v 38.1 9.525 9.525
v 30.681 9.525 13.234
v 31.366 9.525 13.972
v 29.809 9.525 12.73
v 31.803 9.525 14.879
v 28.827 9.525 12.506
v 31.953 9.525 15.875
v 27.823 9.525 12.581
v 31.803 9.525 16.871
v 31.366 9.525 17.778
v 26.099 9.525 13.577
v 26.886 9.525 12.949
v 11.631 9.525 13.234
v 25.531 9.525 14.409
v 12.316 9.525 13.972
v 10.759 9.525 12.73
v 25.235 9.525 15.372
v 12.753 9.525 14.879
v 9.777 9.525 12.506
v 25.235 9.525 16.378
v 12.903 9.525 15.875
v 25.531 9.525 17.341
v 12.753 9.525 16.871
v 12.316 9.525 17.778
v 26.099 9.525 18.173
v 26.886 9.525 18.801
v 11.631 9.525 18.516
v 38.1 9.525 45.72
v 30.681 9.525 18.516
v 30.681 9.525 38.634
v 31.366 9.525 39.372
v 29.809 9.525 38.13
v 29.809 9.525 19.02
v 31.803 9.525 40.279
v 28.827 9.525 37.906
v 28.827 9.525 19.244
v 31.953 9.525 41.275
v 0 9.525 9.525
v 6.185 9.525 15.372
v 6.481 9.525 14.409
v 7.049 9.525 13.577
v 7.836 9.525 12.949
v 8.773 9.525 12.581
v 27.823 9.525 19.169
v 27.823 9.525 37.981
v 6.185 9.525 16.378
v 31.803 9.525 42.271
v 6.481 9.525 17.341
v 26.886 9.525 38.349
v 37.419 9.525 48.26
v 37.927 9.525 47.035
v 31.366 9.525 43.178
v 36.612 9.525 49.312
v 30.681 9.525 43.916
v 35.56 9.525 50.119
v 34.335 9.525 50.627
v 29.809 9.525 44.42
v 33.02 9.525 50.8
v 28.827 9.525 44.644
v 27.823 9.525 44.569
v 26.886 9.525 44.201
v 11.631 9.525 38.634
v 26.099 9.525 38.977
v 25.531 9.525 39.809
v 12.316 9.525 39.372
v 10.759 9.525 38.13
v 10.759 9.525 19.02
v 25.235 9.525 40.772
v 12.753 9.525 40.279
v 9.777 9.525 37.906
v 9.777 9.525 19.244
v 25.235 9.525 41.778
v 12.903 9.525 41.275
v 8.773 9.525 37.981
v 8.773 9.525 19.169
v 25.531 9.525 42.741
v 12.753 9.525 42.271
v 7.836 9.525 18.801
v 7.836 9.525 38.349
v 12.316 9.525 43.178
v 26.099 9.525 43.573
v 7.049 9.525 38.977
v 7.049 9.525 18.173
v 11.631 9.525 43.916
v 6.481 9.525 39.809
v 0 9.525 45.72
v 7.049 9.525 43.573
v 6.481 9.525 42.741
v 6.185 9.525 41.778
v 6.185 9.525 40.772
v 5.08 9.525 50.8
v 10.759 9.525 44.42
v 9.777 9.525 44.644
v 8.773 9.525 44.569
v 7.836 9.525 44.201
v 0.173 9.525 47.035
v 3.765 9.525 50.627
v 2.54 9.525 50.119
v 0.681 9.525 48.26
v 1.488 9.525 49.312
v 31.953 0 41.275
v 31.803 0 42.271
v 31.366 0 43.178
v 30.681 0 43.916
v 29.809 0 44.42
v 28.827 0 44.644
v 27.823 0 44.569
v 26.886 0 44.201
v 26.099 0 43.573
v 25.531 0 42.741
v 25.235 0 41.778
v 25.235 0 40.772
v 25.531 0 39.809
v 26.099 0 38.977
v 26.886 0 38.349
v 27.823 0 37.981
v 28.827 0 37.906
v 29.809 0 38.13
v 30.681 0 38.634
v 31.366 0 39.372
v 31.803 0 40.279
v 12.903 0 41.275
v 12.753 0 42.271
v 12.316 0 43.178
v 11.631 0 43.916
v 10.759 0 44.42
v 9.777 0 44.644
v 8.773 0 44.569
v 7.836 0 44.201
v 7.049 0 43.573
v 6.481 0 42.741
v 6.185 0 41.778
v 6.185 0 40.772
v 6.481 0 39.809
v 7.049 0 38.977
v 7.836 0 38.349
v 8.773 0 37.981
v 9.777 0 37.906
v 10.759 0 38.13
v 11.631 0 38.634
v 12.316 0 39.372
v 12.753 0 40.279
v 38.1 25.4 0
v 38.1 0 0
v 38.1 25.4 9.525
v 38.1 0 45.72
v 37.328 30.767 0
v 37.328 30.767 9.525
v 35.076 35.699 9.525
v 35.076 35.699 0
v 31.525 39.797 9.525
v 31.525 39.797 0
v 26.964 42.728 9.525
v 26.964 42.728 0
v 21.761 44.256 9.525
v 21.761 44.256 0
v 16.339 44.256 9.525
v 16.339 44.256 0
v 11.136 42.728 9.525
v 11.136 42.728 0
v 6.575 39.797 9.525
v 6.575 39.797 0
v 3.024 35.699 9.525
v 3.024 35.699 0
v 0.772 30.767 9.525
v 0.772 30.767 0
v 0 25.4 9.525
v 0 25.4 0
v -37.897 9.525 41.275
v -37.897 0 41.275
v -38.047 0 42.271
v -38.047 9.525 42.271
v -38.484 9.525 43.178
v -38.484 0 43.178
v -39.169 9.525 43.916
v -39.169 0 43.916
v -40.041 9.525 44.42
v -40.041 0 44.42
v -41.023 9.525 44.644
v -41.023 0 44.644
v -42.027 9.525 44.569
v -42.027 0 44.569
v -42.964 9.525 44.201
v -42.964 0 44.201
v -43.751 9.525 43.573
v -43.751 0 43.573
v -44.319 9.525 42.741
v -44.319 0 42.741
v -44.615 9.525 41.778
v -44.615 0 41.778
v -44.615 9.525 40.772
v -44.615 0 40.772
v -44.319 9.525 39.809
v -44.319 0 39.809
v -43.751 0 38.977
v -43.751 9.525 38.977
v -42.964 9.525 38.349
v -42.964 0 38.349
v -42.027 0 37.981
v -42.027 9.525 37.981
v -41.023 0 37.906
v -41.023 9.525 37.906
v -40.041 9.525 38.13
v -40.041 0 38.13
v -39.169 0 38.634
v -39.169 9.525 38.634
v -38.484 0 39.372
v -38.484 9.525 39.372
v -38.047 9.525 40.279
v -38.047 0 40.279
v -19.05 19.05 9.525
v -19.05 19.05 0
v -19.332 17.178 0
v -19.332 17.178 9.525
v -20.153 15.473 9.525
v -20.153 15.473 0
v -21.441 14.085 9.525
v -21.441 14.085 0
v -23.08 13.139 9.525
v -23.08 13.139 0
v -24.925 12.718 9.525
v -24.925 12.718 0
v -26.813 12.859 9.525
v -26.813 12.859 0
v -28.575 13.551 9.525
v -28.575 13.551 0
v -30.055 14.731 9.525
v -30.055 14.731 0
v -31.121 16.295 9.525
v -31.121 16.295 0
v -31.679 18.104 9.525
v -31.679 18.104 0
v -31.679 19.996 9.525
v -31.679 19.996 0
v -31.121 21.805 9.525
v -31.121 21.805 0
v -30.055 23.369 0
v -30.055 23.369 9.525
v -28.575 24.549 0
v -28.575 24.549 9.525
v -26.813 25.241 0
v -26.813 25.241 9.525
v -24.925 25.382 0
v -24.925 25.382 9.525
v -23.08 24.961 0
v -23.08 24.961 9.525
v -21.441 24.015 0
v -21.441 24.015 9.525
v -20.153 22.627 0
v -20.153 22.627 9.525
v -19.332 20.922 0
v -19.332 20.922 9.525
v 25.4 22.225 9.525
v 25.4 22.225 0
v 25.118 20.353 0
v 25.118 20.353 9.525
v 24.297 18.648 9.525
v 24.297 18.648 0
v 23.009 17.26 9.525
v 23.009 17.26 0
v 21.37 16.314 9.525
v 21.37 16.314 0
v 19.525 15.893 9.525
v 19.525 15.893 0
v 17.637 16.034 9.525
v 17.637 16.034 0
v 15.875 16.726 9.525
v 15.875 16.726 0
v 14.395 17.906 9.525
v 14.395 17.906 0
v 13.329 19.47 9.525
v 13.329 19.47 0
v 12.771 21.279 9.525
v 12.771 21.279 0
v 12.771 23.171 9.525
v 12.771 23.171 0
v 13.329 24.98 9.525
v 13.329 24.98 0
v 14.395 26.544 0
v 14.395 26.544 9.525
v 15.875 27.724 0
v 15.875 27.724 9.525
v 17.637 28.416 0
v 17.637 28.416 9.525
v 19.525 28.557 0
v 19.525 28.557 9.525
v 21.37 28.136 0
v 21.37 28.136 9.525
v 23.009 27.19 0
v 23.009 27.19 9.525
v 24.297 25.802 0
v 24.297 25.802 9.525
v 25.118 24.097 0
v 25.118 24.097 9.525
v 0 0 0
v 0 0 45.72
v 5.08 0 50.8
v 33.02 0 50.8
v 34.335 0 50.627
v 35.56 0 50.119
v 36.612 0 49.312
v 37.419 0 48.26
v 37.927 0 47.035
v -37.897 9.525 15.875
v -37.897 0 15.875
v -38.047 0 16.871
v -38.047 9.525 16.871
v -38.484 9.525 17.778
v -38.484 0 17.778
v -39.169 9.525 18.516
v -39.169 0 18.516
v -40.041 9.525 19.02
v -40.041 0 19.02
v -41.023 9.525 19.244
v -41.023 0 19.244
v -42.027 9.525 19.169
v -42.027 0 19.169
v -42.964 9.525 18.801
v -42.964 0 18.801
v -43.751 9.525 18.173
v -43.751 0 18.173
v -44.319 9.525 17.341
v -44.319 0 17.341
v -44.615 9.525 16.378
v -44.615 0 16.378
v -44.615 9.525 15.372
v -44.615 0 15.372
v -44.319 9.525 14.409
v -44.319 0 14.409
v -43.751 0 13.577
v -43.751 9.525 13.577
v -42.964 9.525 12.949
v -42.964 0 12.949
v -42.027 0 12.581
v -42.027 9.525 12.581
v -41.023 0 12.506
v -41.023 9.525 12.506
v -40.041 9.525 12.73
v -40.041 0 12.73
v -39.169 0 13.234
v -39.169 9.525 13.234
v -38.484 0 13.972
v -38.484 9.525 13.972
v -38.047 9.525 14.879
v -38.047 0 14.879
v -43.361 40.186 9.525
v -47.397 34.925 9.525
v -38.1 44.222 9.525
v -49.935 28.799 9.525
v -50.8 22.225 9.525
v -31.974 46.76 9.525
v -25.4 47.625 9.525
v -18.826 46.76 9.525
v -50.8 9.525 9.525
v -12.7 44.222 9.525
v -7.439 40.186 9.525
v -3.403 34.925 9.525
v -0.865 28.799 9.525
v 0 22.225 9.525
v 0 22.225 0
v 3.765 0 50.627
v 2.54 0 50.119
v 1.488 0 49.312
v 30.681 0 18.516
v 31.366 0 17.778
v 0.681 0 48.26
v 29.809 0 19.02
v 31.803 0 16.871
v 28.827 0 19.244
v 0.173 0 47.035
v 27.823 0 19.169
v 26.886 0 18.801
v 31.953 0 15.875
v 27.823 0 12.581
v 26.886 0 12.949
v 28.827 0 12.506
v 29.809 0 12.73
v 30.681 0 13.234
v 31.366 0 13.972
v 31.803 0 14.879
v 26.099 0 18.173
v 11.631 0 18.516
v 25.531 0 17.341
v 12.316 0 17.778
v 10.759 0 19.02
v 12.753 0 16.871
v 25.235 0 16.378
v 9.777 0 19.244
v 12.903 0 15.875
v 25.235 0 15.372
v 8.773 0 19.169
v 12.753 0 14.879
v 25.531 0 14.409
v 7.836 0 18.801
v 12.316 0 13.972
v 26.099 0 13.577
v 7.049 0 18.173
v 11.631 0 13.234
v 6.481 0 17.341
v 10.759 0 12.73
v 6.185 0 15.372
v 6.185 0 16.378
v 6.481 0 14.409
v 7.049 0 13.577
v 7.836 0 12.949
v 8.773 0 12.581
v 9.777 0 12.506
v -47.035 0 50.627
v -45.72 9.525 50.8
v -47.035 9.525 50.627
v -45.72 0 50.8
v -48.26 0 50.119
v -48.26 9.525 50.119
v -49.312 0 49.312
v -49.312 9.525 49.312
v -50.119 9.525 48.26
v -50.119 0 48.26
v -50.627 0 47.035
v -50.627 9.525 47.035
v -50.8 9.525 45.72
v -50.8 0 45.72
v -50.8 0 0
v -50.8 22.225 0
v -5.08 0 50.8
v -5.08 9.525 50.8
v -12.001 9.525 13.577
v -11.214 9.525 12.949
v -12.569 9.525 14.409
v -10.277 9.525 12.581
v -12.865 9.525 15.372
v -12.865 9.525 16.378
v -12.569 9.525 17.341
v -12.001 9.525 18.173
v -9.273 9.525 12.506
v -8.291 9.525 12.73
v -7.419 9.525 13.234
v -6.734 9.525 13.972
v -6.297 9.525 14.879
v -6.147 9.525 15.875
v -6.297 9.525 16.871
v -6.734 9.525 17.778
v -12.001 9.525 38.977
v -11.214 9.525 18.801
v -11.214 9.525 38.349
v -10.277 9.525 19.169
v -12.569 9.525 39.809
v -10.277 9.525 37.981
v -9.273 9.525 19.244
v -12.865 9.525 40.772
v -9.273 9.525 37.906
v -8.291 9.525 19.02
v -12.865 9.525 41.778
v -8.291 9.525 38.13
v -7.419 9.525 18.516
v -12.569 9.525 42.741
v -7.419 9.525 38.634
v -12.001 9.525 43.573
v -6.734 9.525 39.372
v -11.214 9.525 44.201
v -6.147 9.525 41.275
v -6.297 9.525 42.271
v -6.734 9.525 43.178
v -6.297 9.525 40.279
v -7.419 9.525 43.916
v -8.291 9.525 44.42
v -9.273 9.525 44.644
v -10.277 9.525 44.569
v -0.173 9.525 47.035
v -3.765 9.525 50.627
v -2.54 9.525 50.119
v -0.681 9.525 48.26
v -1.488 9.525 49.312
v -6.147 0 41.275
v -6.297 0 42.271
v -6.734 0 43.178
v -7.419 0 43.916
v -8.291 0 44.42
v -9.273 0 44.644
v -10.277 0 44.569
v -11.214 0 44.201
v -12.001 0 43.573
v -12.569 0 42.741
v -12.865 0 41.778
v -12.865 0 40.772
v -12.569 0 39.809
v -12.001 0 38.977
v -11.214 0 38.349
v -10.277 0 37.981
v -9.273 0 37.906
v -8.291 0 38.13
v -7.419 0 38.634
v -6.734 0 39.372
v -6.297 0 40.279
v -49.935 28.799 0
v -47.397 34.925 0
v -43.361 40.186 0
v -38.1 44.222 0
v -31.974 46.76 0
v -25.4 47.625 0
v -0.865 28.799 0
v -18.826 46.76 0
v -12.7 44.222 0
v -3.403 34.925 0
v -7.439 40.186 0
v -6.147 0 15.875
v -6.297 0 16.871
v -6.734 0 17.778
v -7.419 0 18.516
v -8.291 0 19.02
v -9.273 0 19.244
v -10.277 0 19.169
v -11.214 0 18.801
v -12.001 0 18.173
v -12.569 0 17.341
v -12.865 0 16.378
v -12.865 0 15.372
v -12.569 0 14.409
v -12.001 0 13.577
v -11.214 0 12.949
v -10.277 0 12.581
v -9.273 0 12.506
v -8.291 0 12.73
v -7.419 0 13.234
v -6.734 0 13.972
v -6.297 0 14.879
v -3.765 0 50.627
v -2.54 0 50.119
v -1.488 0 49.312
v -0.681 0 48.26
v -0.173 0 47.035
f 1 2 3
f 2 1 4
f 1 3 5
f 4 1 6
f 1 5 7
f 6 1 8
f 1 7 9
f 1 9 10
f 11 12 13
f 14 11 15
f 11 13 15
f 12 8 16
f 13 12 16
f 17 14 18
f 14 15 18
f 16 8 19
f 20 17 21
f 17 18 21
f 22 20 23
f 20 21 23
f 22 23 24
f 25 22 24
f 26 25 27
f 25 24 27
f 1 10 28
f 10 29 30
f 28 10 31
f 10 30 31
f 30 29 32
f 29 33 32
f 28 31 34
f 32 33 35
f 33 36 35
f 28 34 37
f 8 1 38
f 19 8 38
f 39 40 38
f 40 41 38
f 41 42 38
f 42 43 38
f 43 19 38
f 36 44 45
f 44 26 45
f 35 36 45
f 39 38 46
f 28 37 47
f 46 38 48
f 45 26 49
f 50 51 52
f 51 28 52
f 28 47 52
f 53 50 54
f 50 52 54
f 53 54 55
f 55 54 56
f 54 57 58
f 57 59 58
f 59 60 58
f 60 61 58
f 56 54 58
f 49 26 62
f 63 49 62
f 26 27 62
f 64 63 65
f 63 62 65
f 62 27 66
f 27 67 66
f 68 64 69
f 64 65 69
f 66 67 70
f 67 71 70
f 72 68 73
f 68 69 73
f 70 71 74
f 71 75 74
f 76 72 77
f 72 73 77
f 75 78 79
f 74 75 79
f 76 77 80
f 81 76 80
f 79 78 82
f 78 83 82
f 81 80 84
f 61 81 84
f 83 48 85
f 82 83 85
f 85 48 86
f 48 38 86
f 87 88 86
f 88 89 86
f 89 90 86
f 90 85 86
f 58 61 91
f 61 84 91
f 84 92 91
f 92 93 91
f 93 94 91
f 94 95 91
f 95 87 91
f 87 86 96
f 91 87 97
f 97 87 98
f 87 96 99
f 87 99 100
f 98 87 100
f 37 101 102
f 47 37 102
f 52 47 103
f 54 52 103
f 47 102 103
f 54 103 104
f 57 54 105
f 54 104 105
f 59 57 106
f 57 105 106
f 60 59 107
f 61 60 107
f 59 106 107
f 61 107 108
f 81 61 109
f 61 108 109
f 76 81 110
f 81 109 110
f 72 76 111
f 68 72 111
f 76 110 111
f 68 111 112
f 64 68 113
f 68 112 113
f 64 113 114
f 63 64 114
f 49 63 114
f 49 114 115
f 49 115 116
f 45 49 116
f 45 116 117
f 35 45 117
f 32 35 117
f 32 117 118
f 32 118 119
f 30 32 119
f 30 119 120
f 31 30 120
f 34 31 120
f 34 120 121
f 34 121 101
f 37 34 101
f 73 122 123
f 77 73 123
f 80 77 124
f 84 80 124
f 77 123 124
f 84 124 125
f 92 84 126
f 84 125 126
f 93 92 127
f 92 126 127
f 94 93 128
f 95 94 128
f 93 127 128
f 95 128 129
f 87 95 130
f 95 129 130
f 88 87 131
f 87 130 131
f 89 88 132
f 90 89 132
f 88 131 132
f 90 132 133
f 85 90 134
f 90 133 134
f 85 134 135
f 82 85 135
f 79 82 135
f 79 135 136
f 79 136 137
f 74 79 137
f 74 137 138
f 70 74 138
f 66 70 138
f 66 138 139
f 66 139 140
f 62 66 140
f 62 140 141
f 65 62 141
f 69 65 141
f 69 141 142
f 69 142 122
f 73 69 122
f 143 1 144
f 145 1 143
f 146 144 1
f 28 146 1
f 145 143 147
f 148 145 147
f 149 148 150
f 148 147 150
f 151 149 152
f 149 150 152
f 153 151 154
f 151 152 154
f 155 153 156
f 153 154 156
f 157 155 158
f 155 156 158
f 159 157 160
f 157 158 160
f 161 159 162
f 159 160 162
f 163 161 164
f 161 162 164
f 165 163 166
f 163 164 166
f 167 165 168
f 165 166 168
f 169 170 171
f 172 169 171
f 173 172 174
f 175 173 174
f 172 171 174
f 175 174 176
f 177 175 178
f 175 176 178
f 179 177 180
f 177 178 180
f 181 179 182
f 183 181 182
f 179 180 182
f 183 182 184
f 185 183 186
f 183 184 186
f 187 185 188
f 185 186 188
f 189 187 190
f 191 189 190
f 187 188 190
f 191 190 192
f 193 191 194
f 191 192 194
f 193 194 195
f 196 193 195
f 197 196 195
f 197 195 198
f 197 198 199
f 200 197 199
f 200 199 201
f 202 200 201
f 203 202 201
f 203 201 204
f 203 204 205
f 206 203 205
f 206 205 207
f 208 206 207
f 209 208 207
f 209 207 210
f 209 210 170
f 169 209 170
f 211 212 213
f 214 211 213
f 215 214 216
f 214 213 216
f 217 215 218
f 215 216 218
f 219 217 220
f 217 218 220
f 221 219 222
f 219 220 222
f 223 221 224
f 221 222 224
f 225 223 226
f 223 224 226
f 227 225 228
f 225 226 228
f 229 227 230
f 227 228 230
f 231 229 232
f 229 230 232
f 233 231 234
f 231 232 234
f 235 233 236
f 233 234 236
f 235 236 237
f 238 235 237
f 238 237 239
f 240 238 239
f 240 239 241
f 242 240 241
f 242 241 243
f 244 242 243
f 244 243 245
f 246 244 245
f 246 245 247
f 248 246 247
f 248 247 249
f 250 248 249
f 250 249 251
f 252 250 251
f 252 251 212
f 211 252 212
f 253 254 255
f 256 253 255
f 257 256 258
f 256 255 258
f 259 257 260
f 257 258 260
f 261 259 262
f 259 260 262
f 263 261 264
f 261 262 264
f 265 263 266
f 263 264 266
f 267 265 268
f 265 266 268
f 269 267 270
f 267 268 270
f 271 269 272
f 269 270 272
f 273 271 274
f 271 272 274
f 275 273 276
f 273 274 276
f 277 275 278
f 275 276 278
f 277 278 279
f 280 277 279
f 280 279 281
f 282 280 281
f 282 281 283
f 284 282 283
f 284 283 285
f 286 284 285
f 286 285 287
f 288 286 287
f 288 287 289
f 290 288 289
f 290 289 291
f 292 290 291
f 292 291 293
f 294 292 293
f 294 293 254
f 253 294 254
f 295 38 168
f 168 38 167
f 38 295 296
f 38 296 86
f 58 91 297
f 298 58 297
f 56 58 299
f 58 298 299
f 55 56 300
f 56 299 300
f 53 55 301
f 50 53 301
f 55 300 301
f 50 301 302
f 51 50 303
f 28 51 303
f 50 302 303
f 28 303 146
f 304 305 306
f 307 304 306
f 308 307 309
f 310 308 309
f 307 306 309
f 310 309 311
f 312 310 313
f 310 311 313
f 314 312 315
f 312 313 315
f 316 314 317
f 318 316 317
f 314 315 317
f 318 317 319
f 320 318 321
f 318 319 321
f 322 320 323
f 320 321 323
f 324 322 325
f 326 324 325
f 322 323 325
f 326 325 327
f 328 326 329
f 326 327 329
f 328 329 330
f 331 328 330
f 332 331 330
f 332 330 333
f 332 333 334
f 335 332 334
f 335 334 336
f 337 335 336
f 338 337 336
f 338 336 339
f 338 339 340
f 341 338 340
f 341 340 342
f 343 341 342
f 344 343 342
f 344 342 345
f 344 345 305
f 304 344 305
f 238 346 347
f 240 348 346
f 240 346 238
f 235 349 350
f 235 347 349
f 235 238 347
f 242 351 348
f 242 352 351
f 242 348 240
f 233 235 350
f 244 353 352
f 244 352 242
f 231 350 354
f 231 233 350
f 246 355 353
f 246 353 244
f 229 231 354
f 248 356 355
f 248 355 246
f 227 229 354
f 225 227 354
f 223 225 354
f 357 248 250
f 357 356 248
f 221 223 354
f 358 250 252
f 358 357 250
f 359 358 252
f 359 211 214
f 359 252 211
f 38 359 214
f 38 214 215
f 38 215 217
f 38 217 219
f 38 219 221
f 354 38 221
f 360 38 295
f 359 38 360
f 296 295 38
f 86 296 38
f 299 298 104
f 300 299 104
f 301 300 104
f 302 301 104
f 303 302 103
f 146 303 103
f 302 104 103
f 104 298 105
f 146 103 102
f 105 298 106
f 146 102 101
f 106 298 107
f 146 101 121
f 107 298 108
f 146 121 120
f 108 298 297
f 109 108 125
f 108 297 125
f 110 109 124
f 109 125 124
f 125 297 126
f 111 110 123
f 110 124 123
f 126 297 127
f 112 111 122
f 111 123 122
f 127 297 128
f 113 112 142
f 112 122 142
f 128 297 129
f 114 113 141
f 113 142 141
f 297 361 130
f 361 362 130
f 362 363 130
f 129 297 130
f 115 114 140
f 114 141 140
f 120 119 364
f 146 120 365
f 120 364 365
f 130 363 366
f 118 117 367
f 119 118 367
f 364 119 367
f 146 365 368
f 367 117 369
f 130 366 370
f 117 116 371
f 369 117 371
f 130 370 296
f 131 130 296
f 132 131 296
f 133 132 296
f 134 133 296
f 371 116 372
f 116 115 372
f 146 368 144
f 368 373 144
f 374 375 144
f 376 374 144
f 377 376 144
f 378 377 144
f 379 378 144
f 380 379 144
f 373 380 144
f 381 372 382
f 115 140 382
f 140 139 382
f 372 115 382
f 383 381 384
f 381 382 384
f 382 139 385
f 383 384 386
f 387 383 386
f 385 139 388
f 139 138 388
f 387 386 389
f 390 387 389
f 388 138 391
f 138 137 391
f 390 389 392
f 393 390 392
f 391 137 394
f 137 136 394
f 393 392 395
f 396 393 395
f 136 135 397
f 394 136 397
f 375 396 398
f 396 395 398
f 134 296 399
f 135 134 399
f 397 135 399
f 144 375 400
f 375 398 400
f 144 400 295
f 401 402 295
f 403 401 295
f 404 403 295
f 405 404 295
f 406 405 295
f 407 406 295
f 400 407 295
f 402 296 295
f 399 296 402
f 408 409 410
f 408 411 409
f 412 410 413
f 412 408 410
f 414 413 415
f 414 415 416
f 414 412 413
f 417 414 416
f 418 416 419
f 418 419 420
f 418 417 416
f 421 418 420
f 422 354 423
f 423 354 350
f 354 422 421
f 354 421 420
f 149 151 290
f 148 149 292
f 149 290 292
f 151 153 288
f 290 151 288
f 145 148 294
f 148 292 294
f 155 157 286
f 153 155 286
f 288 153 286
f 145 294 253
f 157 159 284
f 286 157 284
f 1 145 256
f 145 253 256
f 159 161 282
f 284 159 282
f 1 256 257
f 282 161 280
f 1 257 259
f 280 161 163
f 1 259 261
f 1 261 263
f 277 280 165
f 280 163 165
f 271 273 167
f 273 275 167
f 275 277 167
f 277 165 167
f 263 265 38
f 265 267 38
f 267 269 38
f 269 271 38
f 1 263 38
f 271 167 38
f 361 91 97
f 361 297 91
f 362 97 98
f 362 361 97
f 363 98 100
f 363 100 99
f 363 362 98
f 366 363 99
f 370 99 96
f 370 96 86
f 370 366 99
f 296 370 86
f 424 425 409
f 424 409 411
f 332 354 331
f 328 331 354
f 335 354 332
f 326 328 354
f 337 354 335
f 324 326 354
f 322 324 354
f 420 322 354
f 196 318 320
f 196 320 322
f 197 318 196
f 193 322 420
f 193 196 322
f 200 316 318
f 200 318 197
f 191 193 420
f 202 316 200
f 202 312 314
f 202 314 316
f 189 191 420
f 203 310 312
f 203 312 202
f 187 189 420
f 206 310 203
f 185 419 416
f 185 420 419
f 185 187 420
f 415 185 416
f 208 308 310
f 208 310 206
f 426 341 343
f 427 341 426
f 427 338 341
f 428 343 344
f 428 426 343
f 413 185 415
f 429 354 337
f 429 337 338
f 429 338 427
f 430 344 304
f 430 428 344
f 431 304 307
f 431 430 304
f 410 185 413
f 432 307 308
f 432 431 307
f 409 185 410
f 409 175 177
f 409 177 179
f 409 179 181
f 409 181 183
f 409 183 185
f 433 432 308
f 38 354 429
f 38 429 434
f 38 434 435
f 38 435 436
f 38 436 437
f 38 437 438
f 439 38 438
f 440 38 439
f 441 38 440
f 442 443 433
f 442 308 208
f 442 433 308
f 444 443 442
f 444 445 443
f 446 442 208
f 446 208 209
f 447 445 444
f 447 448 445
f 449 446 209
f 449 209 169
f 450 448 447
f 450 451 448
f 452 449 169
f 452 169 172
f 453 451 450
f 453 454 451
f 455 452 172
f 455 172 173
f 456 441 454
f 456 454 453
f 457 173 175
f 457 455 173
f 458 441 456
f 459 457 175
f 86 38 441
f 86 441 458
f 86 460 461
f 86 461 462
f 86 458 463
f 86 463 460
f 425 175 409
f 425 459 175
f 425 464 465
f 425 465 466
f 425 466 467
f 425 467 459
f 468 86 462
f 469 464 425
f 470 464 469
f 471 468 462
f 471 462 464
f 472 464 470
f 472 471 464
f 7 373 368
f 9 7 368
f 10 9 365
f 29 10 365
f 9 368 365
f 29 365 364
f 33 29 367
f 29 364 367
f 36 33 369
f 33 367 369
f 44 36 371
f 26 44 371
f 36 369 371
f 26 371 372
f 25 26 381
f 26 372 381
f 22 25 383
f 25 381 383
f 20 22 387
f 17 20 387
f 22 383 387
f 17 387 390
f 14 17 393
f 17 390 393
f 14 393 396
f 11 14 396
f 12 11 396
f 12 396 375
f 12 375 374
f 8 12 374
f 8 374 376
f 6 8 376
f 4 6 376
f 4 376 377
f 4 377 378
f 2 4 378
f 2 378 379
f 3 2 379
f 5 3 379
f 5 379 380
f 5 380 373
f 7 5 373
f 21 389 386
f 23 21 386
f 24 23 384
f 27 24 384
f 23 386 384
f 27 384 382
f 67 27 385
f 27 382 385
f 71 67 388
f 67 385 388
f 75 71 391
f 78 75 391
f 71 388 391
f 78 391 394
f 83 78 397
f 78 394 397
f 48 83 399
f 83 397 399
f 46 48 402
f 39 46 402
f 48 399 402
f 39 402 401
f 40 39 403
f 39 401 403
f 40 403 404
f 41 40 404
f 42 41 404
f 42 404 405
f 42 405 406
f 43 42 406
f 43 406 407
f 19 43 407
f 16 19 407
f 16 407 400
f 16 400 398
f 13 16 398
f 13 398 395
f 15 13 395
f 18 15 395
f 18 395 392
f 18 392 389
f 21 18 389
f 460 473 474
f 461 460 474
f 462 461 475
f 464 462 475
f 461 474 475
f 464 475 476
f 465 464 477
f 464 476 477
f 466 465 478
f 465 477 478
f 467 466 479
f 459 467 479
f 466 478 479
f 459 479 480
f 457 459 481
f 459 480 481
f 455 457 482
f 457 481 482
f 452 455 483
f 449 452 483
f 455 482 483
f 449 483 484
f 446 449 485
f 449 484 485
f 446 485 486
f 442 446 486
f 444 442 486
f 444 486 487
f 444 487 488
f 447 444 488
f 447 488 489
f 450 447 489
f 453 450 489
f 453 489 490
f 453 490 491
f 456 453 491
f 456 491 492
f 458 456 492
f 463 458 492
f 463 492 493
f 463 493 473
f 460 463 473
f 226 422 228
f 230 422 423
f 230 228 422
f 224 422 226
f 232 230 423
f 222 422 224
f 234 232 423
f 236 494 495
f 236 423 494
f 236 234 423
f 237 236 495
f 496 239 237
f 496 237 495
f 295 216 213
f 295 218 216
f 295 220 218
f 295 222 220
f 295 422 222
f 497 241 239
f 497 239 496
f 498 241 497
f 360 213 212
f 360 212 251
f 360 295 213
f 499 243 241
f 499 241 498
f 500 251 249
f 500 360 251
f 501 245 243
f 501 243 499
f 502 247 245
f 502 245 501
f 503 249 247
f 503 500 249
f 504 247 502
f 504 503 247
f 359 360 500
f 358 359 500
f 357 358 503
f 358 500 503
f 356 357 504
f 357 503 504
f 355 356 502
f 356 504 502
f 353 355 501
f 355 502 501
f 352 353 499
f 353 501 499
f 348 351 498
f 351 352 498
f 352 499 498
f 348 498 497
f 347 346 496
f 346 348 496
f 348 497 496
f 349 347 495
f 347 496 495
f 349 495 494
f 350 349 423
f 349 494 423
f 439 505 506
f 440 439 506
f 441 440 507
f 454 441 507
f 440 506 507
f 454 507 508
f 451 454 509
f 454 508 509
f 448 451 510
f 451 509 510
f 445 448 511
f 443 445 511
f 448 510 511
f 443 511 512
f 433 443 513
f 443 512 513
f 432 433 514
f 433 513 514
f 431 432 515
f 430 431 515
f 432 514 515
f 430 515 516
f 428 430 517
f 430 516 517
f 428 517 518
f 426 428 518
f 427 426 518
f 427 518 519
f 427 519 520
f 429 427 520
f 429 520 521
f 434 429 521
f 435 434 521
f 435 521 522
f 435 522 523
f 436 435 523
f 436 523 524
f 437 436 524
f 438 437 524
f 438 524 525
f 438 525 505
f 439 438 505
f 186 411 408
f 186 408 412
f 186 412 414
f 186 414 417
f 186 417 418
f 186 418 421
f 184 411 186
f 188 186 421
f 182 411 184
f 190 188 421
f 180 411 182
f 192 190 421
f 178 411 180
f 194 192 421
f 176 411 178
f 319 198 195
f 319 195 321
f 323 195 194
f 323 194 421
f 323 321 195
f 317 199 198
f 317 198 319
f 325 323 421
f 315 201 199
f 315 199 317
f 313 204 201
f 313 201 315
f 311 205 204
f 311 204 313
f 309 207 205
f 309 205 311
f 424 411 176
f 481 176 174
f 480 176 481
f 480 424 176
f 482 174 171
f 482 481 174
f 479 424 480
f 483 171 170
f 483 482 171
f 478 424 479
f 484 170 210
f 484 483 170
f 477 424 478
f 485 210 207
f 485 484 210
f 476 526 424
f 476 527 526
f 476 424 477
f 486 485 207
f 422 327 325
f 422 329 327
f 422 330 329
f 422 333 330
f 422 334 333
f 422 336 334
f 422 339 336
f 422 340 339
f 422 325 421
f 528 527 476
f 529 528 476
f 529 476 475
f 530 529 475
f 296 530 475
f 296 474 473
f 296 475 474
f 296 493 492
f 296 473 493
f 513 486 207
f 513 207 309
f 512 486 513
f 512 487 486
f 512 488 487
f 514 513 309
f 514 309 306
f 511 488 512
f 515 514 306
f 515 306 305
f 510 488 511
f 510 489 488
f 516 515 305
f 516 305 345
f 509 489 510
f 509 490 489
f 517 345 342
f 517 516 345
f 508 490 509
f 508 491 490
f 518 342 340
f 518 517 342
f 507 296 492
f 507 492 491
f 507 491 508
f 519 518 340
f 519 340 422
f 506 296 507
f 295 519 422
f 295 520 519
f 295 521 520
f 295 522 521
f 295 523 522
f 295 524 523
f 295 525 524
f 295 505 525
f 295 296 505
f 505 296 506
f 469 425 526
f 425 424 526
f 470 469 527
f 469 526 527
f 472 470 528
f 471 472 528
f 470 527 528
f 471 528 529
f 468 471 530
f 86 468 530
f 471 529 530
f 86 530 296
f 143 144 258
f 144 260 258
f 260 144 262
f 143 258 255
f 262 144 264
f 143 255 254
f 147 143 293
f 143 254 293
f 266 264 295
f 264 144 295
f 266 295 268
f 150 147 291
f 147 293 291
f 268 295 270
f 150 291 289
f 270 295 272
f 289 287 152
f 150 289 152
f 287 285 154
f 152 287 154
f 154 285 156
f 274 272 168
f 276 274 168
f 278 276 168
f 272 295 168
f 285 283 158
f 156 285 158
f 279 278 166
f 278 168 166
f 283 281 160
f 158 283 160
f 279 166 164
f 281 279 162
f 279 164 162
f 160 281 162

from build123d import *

# Parameters (mm, degrees)
F1_DEPTH = 38.1
F2_DEPTH = 50.8
F3_R     = 6.35
F4_R     = 6.35
F5_DEPTH = 25.4
F7_D     = 6.7564
F7_2_D   = 6.7564
F8_R     = 5.08
F8_2_R   = 5.08


with BuildPart() as f1:
    # F0 (on Right) → F1 (new body)
    with BuildSketch(Plane.YZ):
        Polygon((9.525, 50.8), (0, 50.8), (0, 0), (50.8, 0), (50.8, 9.525), (9.525, 9.525), align=None)
    extrude(amount=F1_DEPTH)


with BuildPart() as f2:
    # F0 (on Right) → F2 (new body)
    with BuildSketch(Plane.YZ):
        Polygon((9.525, 50.8), (0, 50.8), (0, 0), (50.8, 0), (50.8, 9.525), (9.525, 9.525), align=None)
    extrude(amount=-F2_DEPTH)


with BuildPart() as f5_tool:
    # F3 (on face) + F4 (on face) → F5 (new body)
    with BuildSketch(Plane(origin=(0, 0, 0), x_dir=(1, 0, 0), z_dir=(0, 0, -1))):
        with Locations((19.05, -22.225)):
            Circle(F3_R)
        with BuildLine():
            Line((38.1, -50.8), (38.1, -25.4))
            ThreePointArc((38.1, -25.4), (19.05, -44.45), (0, -25.4))
            Line((0, -25.4), (0, -50.8))
            Line((0, -50.8), (38.1, -50.8))
        make_face()
    with BuildSketch(Plane(origin=(0, 0, 0), x_dir=(1, 0, 0), z_dir=(0, 0, -1))):
        with Locations((-25.4, -19.05)):
            Circle(F4_R)
        with BuildLine():
            Line((0, -50.8), (0, -22.225))
            ThreePointArc((0, -22.225), (-25.4, -47.625), (-50.8, -22.225))
            Line((-50.8, -22.225), (-50.8, -50.8))
            Line((-50.8, -50.8), (0, -50.8))
        make_face()
    extrude(amount=-F5_DEPTH)


with BuildPart() as f1_1:
    add(f1.part)

    # F5: cut by f5_tool
    add(f5_tool.part, mode=Mode.SUBTRACT)

    # F7 (through all)
    with Locations(Plane(origin=(0, 9.525, 0), x_dir=(-1, 0, 0), z_dir=(0, 1, 0))):
        with Locations((-28.575, 41.275), (-9.525, 41.275), (-9.525, 15.875), (-28.575, 15.875), (9.525, 41.275), (9.525, 15.875), (41.275, 15.875), (41.275, 41.275)):
            Hole(F7_D / 2)

    # F8
    f8_edges = [f1_1.edges().sort_by_distance(p)[0] for p in [
        (38.1, 4.7625, 50.8),
        (0, 4.7625, 50.8),
    ]]
    fillet(f8_edges, radius=F8_R)


with BuildPart() as f2_1:
    add(f2.part)

    # F5: cut by f5_tool
    add(f5_tool.part, mode=Mode.SUBTRACT)

    # F7#2 (through all)
    with Locations(Plane(origin=(0, 9.525, 0), x_dir=(-1, 0, 0), z_dir=(0, 1, 0))):
        with Locations((-28.575, 41.275), (-9.525, 41.275), (-9.525, 15.875), (-28.575, 15.875), (9.525, 41.275), (9.525, 15.875), (41.275, 15.875), (41.275, 41.275)):
            Hole(F7_2_D / 2)

    # F8#2
    f8_2_edges = [f2_1.edges().sort_by_distance(p)[0] for p in [
        (0, 4.7625, 50.8),
        (-50.8, 4.7625, 50.8),
    ]]
    fillet(f8_2_edges, radius=F8_2_R)


solid = Compound([f1_1.part, f2_1.part])
